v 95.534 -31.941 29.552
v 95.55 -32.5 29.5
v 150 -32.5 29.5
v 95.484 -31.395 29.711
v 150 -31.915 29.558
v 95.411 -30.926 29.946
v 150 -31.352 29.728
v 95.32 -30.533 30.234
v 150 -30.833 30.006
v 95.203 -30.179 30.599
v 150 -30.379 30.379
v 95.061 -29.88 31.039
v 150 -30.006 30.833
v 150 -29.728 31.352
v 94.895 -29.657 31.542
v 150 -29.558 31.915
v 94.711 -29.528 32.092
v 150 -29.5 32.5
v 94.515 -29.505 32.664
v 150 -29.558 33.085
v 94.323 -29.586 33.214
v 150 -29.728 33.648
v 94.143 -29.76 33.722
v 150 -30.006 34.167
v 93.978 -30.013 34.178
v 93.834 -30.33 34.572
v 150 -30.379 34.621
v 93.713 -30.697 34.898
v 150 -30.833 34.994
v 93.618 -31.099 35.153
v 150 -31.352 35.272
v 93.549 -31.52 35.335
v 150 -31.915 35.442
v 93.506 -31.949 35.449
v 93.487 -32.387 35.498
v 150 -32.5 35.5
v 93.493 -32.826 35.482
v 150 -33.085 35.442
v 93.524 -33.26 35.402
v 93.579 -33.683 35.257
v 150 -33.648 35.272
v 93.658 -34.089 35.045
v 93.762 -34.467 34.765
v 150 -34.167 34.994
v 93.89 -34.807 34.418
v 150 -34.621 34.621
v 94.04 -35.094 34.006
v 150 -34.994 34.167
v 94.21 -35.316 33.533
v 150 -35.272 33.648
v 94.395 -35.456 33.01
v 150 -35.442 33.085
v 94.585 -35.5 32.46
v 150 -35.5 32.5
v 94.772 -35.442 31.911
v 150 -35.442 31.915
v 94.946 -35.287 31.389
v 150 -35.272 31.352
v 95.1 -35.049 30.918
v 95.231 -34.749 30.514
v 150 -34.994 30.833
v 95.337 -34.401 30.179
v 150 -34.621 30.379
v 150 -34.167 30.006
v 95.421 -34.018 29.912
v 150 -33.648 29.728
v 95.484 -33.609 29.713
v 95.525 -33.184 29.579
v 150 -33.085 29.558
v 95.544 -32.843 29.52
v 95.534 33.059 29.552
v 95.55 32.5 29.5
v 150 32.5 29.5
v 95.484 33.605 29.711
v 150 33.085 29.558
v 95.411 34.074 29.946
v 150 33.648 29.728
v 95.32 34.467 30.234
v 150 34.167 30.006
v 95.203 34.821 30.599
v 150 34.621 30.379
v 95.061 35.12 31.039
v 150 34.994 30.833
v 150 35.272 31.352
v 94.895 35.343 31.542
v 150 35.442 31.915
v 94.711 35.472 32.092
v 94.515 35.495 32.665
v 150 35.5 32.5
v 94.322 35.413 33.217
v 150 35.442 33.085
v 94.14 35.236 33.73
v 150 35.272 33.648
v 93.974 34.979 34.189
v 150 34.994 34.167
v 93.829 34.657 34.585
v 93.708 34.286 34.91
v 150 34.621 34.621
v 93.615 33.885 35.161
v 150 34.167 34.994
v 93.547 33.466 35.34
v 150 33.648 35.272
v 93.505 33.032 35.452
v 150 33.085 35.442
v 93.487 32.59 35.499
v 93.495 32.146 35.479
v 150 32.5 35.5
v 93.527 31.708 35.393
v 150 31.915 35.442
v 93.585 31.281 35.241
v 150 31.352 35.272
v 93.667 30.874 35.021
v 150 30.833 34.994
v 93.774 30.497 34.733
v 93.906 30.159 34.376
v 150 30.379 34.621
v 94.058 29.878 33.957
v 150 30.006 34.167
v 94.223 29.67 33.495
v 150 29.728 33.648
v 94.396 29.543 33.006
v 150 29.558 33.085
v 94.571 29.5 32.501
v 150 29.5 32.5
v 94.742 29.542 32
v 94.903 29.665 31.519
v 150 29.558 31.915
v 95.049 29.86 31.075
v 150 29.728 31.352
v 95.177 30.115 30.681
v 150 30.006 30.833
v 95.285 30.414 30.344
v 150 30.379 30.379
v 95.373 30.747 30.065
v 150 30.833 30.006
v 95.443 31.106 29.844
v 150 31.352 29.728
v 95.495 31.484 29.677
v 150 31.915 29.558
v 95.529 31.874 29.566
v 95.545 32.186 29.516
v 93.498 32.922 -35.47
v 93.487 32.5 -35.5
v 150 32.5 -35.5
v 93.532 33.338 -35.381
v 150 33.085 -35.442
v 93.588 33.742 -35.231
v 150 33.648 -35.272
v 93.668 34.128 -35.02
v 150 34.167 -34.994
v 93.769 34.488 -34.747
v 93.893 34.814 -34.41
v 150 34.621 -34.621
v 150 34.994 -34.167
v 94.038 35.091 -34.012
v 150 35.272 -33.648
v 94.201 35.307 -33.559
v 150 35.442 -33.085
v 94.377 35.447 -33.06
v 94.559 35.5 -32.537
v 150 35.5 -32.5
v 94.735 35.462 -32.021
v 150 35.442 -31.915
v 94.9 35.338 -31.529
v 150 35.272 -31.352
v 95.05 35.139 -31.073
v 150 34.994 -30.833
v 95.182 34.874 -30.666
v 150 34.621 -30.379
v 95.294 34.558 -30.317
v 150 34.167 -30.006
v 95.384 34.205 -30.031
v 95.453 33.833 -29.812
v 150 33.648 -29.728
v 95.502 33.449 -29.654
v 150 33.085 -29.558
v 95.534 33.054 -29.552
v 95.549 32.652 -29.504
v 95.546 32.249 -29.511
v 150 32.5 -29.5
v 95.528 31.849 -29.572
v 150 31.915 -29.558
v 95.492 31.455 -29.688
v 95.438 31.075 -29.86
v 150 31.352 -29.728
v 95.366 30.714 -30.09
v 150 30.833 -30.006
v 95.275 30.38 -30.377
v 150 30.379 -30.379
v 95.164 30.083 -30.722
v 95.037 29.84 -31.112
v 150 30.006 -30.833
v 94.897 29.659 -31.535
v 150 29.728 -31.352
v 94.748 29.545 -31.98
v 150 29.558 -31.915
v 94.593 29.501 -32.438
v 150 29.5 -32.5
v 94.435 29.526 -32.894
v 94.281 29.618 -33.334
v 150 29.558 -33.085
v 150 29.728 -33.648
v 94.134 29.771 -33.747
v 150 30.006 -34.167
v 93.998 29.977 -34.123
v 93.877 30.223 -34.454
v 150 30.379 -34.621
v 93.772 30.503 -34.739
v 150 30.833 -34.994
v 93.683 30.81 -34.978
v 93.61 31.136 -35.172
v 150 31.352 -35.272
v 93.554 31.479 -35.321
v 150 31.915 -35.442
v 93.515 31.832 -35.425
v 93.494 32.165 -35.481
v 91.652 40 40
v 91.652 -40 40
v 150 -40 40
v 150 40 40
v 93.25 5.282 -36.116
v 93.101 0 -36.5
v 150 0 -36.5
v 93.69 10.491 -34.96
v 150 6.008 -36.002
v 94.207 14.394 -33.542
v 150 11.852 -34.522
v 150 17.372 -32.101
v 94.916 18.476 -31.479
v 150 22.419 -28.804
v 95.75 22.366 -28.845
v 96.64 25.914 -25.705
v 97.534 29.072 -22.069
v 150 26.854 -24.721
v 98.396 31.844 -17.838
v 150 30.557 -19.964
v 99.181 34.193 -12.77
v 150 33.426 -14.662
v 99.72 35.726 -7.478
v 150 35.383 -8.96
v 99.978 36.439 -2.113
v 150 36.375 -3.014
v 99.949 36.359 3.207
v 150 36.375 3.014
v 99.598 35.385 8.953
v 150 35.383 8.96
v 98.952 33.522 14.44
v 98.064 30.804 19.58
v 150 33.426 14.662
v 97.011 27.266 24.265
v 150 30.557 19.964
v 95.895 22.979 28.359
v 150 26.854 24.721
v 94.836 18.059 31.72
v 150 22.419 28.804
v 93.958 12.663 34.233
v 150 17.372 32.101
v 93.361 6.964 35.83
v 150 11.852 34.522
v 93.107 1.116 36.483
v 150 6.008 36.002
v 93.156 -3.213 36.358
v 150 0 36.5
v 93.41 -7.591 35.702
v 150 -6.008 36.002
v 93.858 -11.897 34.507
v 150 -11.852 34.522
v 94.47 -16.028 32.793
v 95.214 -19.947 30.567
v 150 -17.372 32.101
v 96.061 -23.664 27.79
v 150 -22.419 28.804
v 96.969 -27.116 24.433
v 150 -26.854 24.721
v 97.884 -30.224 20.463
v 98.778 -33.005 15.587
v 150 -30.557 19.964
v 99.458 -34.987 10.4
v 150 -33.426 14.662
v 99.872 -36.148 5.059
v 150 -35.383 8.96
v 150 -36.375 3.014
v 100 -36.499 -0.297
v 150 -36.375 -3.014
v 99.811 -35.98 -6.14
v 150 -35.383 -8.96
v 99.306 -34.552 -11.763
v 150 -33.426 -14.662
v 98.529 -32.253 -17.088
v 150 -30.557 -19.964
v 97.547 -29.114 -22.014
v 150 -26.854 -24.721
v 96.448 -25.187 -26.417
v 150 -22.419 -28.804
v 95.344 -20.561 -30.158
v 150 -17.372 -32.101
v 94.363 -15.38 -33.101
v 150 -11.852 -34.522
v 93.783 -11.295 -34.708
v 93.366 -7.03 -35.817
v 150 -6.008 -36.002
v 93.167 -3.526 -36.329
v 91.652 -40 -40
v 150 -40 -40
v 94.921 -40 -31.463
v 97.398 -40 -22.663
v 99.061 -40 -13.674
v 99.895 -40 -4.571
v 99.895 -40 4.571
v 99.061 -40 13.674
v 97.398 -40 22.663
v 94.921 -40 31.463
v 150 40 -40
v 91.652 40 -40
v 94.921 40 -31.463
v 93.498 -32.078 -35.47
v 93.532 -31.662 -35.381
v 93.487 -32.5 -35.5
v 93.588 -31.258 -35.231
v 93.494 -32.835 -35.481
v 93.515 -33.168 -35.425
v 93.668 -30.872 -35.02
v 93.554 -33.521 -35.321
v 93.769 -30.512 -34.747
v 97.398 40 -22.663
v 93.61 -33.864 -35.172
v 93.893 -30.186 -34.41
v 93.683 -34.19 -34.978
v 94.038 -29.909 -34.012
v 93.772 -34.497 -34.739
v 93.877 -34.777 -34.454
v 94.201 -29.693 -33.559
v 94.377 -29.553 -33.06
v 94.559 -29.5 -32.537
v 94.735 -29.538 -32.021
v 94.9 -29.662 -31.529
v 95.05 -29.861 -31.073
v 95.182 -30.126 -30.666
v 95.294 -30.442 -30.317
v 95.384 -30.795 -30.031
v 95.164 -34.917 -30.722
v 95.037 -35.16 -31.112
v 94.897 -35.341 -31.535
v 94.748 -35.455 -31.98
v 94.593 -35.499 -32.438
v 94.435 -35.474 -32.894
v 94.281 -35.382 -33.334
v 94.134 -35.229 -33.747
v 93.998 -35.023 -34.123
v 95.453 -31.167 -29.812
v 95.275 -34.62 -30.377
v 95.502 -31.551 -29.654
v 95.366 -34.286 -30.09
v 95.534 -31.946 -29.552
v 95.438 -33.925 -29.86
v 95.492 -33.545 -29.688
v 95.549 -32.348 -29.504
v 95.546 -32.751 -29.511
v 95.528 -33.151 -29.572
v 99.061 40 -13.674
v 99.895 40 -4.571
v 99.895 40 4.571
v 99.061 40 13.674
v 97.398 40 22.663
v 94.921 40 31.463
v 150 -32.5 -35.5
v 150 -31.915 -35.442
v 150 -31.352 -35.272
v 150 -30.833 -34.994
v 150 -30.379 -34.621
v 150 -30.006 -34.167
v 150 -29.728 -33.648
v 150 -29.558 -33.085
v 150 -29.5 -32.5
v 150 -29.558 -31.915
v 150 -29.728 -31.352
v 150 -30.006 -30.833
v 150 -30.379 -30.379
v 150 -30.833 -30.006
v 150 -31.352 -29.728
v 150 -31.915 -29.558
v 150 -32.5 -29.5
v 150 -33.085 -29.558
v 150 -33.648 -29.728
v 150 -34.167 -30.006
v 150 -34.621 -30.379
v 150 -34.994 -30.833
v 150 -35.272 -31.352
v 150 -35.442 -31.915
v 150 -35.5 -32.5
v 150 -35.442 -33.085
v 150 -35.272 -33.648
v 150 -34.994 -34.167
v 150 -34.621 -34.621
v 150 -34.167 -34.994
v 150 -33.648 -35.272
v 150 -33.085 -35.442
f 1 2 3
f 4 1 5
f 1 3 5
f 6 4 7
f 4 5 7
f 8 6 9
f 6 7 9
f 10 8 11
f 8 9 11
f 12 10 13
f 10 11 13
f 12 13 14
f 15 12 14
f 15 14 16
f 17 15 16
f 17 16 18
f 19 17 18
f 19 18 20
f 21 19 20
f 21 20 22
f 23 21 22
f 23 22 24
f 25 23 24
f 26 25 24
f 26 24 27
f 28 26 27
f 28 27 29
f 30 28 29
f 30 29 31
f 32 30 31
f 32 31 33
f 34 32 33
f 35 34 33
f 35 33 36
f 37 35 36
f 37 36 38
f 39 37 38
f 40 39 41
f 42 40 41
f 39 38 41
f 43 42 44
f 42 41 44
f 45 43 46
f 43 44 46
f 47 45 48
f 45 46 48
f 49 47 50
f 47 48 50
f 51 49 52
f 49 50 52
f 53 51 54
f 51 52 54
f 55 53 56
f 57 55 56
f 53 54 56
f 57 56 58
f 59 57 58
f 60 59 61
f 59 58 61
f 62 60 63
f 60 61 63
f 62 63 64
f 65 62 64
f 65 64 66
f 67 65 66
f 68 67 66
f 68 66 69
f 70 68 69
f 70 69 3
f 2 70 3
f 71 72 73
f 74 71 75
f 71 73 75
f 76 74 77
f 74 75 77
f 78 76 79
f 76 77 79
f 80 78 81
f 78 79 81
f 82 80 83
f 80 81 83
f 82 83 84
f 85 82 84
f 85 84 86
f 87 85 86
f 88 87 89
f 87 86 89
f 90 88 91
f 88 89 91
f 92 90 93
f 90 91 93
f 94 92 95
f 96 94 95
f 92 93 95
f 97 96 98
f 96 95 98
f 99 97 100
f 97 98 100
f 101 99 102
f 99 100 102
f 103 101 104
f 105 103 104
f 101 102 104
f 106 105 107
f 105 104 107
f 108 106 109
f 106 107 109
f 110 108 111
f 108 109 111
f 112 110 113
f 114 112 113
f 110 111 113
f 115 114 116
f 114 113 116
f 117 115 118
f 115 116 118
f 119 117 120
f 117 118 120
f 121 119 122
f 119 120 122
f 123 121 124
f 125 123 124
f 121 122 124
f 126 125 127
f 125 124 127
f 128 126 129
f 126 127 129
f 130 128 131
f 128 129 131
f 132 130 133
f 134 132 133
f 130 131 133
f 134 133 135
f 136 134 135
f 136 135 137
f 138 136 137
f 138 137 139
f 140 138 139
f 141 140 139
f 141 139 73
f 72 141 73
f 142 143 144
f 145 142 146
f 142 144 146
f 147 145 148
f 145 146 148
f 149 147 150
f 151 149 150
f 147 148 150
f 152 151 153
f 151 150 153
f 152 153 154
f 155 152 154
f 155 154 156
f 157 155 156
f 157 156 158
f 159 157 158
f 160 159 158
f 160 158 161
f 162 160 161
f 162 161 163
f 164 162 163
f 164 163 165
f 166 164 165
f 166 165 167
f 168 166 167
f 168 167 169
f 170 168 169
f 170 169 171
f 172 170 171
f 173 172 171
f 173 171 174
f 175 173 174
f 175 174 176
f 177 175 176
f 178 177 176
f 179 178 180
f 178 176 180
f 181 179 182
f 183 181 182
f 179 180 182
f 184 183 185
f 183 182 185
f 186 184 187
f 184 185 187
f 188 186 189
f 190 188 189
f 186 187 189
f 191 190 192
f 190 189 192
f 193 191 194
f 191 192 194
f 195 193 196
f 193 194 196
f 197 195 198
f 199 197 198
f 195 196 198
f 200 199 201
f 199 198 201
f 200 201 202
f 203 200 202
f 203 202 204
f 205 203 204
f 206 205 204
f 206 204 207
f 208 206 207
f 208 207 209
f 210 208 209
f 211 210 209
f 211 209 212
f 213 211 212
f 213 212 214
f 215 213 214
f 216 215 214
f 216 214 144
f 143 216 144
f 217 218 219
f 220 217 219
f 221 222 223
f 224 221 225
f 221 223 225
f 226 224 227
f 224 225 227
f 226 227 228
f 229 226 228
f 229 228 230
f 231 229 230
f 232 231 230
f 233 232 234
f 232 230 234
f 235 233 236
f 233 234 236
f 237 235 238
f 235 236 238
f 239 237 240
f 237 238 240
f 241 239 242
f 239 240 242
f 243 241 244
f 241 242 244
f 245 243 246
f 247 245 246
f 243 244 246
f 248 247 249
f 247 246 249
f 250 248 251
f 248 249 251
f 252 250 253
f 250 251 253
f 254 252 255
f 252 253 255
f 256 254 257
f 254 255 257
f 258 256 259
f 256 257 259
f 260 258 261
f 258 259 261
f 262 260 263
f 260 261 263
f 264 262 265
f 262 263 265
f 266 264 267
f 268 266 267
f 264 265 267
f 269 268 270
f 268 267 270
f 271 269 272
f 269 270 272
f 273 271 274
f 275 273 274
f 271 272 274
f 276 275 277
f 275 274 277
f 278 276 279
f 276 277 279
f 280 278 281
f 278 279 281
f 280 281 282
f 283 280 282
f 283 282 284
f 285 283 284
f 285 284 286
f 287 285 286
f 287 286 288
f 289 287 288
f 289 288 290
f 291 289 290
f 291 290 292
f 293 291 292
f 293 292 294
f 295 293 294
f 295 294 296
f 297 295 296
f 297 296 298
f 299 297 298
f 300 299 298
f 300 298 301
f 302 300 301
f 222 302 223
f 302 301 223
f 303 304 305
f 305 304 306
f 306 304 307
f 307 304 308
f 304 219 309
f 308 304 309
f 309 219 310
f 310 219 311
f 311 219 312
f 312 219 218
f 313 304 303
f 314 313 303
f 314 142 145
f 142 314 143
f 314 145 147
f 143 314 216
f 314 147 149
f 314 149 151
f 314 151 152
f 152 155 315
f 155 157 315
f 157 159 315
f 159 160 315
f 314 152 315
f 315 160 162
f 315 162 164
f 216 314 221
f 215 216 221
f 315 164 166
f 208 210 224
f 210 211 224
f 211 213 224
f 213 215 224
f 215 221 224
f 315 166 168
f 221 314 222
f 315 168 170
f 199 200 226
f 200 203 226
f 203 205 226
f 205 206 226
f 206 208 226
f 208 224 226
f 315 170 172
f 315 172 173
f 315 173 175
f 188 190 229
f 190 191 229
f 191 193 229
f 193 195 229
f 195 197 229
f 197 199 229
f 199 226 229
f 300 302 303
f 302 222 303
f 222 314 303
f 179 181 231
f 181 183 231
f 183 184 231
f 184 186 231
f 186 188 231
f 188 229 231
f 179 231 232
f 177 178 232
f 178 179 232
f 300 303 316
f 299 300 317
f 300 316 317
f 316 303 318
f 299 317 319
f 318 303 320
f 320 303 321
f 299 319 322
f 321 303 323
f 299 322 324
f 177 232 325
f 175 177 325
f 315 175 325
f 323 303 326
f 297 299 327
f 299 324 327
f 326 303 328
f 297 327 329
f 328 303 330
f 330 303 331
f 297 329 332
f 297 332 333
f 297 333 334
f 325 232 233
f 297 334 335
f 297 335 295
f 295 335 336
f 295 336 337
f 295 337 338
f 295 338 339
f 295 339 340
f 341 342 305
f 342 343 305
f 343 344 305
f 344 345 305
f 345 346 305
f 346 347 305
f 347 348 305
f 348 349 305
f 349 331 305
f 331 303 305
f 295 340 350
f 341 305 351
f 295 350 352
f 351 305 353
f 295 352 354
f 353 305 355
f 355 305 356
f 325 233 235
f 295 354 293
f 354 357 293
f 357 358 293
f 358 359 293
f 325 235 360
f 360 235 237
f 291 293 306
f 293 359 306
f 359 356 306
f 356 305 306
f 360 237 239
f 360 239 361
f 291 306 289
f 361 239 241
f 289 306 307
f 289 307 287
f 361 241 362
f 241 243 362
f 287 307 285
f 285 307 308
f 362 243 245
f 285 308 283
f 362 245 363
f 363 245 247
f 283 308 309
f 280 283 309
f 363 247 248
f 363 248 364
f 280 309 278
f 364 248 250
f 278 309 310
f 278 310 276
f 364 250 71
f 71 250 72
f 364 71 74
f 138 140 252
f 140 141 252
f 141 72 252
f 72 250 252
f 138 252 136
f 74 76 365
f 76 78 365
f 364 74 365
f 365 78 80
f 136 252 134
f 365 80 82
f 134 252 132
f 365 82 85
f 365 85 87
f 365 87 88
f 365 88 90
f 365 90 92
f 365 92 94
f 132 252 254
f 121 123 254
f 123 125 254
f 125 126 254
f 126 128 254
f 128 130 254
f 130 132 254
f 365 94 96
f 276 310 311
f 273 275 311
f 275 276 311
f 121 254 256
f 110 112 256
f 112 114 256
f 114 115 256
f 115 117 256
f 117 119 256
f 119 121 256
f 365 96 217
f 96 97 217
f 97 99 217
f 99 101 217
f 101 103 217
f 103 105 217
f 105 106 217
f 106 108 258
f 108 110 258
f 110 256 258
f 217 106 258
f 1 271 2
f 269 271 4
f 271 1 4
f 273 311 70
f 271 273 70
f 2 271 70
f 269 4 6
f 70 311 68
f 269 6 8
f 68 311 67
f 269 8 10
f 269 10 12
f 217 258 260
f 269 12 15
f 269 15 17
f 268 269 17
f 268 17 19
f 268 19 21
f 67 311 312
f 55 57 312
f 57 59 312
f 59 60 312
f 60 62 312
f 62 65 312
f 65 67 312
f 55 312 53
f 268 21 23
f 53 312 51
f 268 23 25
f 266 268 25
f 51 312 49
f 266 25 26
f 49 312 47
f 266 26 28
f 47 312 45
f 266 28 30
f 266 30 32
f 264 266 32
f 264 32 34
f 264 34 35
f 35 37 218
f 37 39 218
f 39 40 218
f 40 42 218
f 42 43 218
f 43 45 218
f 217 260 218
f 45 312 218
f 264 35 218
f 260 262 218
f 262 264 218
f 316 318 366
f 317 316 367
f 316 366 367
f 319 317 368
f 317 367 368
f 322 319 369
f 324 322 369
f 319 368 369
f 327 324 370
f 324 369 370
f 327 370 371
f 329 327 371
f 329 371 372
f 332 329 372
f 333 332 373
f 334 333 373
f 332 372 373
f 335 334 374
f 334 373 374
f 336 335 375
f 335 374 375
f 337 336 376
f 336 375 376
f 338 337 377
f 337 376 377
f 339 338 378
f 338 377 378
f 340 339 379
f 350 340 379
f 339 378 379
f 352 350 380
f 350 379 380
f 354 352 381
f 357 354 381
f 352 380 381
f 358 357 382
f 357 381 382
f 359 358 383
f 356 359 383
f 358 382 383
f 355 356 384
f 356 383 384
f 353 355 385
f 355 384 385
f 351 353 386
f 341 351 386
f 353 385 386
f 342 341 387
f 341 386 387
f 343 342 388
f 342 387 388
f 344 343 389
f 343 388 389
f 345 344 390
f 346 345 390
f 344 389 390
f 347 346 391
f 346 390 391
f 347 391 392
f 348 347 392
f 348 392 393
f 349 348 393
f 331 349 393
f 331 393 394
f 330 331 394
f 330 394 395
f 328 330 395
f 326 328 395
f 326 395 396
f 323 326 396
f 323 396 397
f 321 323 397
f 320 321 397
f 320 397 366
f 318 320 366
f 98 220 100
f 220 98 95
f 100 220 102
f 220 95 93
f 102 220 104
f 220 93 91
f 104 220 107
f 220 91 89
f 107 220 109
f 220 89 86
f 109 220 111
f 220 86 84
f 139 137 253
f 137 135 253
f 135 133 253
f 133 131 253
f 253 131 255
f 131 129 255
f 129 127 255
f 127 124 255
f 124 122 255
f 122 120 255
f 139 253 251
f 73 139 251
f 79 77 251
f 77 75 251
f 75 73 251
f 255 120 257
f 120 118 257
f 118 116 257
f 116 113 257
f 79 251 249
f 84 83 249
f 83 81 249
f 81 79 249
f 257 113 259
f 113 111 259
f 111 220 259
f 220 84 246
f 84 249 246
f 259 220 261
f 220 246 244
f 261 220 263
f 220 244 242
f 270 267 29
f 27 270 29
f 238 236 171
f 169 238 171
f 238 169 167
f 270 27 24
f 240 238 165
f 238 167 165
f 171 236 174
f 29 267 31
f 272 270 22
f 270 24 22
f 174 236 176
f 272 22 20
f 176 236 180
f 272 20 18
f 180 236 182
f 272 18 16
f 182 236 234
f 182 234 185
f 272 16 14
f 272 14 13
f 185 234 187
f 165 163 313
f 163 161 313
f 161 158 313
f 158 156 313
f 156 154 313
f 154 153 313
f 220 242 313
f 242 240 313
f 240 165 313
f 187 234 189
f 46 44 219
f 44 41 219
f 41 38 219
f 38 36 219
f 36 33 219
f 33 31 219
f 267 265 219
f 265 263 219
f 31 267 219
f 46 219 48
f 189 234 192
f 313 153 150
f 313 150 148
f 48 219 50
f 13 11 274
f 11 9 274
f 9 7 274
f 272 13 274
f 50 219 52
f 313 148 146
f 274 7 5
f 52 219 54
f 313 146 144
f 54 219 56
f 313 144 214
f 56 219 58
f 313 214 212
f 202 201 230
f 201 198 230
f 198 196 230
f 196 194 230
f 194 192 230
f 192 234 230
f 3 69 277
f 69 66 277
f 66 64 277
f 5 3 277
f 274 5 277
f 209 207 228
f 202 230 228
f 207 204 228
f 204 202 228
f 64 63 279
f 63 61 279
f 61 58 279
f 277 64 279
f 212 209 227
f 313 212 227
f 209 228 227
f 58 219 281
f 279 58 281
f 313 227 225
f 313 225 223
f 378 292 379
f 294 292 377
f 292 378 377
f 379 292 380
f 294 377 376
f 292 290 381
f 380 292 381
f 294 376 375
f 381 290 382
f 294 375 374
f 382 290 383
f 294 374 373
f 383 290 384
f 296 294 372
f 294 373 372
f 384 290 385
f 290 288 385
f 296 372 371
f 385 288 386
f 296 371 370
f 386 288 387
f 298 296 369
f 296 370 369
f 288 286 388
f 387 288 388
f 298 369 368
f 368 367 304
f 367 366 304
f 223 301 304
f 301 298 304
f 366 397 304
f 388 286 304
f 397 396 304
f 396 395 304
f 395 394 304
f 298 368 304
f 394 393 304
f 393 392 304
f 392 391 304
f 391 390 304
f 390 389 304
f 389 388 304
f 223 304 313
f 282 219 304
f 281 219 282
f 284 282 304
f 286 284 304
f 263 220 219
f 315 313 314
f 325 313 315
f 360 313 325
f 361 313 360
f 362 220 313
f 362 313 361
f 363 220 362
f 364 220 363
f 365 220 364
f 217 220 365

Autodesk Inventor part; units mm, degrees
ref_plane "YZ Plane" through (0, 0, 0) normal (1, 0, 0) x (0, 1, 0)
ref_plane "XZ Plane" through (0, 0, 0) normal (0, 1, 0) x (-1, 0, 0)
ref_plane "XY Plane" through (0, 0, 0) normal (0, 0, 1) x (1, 0, 0)
sketch "Skizze1" plane through (0, 0, 0) normal (0, 1, 0) x (-1, 0, 0)
  circle A0 centre (0, 0) radius 100
  circle A1 centre (0, 0) radius 95.1
  line L0 (100, 0) -> (-150, 0) construction
  line L1 (-91.6515, 40) -> (-150, 40)
  line L2 (-150, 40) -> (-150, -40)
  line L3 (-150, -40) -> (-91.6515, -40)
  dimension "d0" = 200
  dimension "d1" = 4.9
  dimension "d2" = 150
  dimension "d3" = 80
extrude "Extrusion1" add sketch "Skizze1" along normal mid plane 80 contours A0 L3 L2 L1
sketch "Skizze2" plane through (150, -40, -40) normal (1, 0, 0) x (0, 0, -1)
  circle A0 centre (-40, 40) radius 36.5
  line L0 (-72.5, 7.5) -> (-7.5, 7.5)
  line L1 (-7.5, 7.5) -> (-7.5, 72.5)
  line L2 (-7.5, 72.5) -> (-72.5, 72.5)
  line L3 (-72.5, 72.5) -> (-72.5, 7.5)
  line L4 (-72.5, 7.5) -> (-7.5, 72.5) construction
  line L5 (-7.5, 7.5) -> (-72.5, 72.5) construction
  circle A1 centre (-72.5, 72.5) radius 3
  circle A2 centre (-7.5, 72.5) radius 3
  circle A3 centre (-7.5, 7.5) radius 3
  circle A4 centre (-72.5, 7.5) radius 3
  point P0 (-40, 40)
  dimension "d6" = 73
  dimension "d9" = 65
  dimension "d10" = 6
extrude "Extrusion2" cut sketch "Skizze2" against normal through all contours A0 L1 | L1 A0 L0 L3 L2 | L2 A0 | A2 L2 L1 | L1 L2 A2 | A0 L0 | A3 L0 L1 | L1 L0 A3 | L3 A0 | A1 L3 L2 | L2 L3 A1 | A4 L3 L0 | L0 L3 A4
equation "\"d0\" = kg_diameter"
equation "\"d1\" = kg_thickness"
equation "\"d4\" = d3"
equation "\"d6\" = bore_diameter"
equation "\"kg_diameter\" = 200"
equation "\"kg_thickness\" = 4.9"
equation "\"ht_thickness\" = 1.9"
equation "\"case_thickness\" = 18"
equation "\"gap_fit\" = 0.1"
equation "\"gap_slide\" = 0.2"
equation "\"gap_air\" = 1"
equation "\"bore_diameter\" = 73"
properties part number "Bohrhilfe"
